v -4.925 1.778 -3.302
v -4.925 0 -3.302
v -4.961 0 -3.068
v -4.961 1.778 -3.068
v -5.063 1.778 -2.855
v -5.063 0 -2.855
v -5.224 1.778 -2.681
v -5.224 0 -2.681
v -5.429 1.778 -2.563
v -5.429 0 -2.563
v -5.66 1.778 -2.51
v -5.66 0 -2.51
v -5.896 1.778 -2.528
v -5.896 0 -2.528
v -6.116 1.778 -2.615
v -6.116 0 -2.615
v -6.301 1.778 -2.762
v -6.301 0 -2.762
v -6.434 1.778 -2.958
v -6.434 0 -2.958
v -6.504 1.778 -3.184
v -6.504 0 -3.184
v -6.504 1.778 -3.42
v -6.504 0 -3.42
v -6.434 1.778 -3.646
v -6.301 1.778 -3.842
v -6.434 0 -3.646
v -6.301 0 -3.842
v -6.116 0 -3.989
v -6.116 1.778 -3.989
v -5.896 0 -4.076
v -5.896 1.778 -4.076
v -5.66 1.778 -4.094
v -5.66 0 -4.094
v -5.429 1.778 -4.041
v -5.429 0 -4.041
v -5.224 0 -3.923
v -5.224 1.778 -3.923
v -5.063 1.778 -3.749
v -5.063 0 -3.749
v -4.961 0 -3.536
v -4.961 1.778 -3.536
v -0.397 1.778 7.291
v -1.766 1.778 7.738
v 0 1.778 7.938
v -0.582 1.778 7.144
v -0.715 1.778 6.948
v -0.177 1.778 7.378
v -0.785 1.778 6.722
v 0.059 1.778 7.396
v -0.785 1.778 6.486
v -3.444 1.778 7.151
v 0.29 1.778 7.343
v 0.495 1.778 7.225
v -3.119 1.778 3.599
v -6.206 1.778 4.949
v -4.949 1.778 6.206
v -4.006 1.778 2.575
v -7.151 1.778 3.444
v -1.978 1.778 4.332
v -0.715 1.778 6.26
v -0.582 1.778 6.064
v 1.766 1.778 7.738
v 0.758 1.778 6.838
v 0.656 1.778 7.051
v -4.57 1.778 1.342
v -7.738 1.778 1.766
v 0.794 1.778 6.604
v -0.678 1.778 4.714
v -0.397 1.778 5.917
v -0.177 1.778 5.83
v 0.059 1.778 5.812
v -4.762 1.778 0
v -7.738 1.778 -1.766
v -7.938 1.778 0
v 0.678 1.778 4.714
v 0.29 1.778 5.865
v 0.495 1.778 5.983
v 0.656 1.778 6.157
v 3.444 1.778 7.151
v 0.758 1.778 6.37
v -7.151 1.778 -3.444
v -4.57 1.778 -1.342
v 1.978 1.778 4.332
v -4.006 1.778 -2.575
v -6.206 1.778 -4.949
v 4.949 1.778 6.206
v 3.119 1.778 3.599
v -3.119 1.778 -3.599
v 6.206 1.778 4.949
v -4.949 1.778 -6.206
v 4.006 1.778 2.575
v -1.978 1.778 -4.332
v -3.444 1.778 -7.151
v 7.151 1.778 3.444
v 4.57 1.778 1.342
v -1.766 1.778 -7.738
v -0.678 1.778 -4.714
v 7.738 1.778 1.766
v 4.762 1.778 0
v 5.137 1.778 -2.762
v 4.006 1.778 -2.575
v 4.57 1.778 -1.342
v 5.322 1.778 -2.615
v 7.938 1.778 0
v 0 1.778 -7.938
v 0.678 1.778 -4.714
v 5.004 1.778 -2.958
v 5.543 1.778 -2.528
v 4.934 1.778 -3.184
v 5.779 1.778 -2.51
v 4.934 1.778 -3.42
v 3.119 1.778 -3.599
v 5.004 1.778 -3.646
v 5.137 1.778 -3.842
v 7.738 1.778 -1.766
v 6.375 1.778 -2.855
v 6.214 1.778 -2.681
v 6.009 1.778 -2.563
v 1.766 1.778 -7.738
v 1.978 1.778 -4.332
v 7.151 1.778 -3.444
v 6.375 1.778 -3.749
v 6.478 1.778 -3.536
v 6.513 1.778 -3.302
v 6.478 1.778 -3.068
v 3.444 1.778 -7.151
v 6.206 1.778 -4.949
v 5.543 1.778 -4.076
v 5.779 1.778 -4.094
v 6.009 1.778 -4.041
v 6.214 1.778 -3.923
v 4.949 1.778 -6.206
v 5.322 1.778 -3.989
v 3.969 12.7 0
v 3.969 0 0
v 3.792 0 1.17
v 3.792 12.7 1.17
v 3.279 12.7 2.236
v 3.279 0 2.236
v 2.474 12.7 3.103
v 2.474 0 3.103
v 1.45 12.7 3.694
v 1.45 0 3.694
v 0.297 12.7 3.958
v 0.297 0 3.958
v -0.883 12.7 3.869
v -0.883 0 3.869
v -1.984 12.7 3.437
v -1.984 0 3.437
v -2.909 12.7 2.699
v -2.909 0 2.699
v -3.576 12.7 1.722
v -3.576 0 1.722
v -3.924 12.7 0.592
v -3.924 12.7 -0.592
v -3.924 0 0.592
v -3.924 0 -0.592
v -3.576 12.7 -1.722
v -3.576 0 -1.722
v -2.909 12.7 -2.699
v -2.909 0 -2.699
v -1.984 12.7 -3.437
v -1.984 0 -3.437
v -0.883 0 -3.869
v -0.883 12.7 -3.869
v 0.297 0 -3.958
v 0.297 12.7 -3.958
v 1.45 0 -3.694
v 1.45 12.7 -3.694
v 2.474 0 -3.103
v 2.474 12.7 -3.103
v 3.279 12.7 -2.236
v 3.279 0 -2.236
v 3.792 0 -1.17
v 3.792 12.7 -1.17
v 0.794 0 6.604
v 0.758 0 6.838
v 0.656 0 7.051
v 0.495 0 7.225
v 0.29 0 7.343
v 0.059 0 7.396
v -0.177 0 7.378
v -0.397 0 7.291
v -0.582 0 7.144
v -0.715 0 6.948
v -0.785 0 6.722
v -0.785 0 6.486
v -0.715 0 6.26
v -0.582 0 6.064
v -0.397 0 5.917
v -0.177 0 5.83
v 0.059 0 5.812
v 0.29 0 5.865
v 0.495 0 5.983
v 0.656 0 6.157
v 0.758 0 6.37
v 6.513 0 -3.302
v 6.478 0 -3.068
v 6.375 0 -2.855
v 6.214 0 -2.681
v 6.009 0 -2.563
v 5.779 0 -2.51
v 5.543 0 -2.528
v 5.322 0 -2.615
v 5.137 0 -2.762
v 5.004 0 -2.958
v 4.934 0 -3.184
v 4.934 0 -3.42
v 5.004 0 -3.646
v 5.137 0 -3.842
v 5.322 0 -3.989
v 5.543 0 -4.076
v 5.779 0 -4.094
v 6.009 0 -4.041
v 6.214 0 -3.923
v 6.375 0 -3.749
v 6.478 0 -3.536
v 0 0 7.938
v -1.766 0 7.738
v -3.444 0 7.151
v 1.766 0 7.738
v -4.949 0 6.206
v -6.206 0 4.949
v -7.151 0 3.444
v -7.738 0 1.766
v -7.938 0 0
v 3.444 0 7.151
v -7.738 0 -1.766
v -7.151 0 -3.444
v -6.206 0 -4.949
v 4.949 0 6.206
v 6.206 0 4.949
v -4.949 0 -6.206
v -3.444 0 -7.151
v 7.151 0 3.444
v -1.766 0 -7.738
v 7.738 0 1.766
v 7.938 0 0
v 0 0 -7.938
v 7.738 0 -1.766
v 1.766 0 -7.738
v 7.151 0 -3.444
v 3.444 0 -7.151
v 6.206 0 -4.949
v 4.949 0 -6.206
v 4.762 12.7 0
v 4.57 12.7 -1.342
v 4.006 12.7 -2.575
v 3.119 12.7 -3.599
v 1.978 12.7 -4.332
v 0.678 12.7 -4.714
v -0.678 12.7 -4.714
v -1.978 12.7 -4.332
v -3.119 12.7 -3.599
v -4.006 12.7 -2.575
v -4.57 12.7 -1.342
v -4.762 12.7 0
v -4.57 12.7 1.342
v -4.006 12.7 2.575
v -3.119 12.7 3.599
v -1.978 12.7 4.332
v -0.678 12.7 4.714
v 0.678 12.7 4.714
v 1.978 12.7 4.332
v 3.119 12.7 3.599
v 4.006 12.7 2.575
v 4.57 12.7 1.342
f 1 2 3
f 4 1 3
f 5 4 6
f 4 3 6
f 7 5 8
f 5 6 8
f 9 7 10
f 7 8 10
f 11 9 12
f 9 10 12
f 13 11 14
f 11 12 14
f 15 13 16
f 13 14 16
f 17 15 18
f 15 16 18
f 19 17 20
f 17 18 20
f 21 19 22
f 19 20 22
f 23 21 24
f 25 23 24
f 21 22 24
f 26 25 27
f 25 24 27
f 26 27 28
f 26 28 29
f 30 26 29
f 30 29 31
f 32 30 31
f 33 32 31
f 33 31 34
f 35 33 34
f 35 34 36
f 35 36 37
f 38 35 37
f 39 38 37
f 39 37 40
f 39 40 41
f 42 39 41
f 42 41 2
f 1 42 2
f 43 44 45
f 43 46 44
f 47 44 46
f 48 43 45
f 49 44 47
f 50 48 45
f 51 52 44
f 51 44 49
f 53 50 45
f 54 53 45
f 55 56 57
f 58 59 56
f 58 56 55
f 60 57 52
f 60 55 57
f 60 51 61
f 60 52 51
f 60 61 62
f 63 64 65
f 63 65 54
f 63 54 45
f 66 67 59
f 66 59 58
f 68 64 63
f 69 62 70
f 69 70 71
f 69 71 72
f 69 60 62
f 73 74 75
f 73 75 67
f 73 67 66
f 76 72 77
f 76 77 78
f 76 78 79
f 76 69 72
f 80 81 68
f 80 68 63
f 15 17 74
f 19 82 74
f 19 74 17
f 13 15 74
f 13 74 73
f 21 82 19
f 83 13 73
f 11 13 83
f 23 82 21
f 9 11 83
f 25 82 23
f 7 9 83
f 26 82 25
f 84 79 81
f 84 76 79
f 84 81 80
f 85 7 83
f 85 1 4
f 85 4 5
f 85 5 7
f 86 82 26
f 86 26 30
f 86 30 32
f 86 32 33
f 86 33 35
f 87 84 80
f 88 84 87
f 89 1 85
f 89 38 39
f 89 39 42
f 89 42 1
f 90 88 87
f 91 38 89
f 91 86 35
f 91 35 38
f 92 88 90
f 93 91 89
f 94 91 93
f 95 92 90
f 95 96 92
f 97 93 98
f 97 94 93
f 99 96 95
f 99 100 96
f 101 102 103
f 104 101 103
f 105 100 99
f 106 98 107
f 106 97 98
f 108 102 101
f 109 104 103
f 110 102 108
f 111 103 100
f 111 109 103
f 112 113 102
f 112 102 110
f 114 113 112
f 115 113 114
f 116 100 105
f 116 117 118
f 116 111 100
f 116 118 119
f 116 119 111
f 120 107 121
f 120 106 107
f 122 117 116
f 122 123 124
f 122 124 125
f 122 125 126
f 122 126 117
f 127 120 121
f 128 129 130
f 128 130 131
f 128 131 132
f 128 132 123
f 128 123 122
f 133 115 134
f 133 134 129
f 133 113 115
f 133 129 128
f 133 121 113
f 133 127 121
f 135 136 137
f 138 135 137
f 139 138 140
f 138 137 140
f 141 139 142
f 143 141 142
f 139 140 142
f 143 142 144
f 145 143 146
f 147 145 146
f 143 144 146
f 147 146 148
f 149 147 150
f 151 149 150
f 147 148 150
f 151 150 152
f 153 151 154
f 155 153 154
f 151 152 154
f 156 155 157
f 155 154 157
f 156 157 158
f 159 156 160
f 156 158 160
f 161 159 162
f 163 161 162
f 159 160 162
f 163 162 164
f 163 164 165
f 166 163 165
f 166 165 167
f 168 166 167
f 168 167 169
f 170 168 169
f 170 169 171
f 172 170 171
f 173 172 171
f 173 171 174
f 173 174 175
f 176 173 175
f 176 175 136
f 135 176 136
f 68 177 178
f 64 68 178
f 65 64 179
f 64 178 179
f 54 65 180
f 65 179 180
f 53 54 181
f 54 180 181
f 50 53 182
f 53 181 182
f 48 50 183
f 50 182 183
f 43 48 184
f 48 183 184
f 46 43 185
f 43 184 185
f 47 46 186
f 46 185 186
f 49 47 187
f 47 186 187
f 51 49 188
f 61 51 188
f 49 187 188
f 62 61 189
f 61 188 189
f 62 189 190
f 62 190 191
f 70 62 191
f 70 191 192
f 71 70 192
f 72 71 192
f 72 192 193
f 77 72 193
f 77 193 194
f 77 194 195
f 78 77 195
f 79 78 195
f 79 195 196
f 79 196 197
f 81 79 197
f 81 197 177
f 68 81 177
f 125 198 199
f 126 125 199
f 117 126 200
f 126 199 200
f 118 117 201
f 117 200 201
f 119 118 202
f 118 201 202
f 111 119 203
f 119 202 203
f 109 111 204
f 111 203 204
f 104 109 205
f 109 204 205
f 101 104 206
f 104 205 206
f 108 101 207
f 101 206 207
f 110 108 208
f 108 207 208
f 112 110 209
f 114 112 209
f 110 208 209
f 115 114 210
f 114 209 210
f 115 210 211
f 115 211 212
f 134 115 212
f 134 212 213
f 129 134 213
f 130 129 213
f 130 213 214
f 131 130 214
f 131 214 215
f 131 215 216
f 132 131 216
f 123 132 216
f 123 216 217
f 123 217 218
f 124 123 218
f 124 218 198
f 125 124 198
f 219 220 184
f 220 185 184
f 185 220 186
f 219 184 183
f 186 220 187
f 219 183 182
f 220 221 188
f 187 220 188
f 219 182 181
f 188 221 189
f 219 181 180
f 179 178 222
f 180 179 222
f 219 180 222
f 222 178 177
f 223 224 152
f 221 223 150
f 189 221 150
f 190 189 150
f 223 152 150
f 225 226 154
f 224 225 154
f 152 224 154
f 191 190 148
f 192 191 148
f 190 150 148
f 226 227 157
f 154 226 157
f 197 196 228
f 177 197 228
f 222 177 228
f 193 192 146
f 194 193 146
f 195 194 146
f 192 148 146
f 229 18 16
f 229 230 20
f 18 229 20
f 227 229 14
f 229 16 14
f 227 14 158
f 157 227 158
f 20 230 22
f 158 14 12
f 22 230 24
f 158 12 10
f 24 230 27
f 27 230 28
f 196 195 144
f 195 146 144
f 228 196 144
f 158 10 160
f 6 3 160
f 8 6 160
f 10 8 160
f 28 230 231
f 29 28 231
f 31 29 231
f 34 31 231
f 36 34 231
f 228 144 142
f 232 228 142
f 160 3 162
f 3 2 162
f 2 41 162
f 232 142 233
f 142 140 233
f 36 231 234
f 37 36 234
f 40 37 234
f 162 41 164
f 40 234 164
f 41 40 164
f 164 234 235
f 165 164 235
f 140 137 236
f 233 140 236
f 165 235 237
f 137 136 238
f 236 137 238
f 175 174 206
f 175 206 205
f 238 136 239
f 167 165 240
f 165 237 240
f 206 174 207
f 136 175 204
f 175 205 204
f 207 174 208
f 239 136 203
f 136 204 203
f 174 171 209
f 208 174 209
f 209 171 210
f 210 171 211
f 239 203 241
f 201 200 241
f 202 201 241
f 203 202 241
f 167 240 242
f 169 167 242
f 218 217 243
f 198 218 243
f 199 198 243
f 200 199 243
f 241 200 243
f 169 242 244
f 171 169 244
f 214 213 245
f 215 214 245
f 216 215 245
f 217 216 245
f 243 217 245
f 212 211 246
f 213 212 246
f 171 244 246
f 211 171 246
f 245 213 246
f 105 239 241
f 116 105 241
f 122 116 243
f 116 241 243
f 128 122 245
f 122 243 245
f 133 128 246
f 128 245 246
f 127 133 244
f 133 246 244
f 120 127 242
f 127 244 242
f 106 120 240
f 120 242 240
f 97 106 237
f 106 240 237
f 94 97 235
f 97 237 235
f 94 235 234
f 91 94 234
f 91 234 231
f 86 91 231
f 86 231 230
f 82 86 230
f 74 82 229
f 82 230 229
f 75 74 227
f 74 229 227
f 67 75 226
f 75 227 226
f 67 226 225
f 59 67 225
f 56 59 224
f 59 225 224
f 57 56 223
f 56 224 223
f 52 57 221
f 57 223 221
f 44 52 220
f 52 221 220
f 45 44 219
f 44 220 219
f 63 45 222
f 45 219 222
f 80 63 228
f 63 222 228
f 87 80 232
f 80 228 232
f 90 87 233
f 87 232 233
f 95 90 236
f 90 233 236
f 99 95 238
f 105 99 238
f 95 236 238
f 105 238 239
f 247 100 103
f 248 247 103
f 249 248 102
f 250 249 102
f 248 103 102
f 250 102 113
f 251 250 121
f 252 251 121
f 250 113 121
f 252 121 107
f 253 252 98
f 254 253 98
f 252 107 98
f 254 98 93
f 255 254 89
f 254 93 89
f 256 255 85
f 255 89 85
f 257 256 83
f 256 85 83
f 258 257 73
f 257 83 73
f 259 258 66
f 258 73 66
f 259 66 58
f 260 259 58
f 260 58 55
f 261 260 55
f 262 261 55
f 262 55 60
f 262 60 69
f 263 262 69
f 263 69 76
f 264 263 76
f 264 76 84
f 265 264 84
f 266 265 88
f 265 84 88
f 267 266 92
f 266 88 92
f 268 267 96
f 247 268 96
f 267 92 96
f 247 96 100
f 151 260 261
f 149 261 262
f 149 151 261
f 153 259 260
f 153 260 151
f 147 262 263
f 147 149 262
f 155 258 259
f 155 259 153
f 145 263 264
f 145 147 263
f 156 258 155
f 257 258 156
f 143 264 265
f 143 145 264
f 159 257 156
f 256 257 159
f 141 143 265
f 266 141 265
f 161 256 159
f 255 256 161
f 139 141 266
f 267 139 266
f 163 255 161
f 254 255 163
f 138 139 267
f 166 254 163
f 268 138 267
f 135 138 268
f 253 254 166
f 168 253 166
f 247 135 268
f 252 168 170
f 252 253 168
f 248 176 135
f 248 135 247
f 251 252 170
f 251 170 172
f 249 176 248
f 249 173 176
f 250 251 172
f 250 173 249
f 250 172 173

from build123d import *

# Parameters (mm, degrees)
SKETCH1_R               = 7.9375
BOSS_EXTRUDE1_DEPTH     = 1.778
SKETCH2_R               = 4.7625
BOSS_EXTRUDE2_DEPTH     = 10.922
SKETCH4_R               = 3.96875
CUT_EXTRUDE3_DEPTH      = 1
CUT_EXTRUDE3_DEPTH_BACK = 13.7
SKETCH7_R               = 0.79375
CUT_EXTRUDE5_DEPTH      = 13.7


with BuildPart() as part:
    # Sketch1 → Boss-Extrude1 (new body)
    with BuildSketch(Plane(origin=(0, 0, 0), x_dir=(1, 0, 0), z_dir=(0, 1, 0))):
        Circle(SKETCH1_R)
    extrude(amount=BOSS_EXTRUDE1_DEPTH)

    # Sketch2 → Boss-Extrude2 (add)
    with BuildSketch(Plane(origin=(0, 1.778, 0), x_dir=(1, 0, 0), z_dir=(0, 1, 0))):
        Circle(SKETCH2_R)
    extrude(amount=BOSS_EXTRUDE2_DEPTH)

    # Sketch4 → Cut-Extrude3 (cut, two sides)
    with BuildSketch(Plane.XZ) as cut_extrude3_sk:
        Circle(SKETCH4_R)
    extrude(amount=CUT_EXTRUDE3_DEPTH, mode=Mode.SUBTRACT)
    extrude(cut_extrude3_sk.sketch, amount=-CUT_EXTRUDE3_DEPTH_BACK, mode=Mode.SUBTRACT)

    # Sketch7 → Cut-Extrude5 (cut, through all)
    with BuildSketch(Plane.XZ):
        with Locations((0, 6.604)):
            Circle(SKETCH7_R)
        with Locations((5.719231767, -3.302)):
            Circle(SKETCH7_R)
        with Locations((-5.719231767, -3.302)):
            Circle(SKETCH7_R)
    extrude(amount=-CUT_EXTRUDE5_DEPTH, mode=Mode.SUBTRACT)


solid = part.part
